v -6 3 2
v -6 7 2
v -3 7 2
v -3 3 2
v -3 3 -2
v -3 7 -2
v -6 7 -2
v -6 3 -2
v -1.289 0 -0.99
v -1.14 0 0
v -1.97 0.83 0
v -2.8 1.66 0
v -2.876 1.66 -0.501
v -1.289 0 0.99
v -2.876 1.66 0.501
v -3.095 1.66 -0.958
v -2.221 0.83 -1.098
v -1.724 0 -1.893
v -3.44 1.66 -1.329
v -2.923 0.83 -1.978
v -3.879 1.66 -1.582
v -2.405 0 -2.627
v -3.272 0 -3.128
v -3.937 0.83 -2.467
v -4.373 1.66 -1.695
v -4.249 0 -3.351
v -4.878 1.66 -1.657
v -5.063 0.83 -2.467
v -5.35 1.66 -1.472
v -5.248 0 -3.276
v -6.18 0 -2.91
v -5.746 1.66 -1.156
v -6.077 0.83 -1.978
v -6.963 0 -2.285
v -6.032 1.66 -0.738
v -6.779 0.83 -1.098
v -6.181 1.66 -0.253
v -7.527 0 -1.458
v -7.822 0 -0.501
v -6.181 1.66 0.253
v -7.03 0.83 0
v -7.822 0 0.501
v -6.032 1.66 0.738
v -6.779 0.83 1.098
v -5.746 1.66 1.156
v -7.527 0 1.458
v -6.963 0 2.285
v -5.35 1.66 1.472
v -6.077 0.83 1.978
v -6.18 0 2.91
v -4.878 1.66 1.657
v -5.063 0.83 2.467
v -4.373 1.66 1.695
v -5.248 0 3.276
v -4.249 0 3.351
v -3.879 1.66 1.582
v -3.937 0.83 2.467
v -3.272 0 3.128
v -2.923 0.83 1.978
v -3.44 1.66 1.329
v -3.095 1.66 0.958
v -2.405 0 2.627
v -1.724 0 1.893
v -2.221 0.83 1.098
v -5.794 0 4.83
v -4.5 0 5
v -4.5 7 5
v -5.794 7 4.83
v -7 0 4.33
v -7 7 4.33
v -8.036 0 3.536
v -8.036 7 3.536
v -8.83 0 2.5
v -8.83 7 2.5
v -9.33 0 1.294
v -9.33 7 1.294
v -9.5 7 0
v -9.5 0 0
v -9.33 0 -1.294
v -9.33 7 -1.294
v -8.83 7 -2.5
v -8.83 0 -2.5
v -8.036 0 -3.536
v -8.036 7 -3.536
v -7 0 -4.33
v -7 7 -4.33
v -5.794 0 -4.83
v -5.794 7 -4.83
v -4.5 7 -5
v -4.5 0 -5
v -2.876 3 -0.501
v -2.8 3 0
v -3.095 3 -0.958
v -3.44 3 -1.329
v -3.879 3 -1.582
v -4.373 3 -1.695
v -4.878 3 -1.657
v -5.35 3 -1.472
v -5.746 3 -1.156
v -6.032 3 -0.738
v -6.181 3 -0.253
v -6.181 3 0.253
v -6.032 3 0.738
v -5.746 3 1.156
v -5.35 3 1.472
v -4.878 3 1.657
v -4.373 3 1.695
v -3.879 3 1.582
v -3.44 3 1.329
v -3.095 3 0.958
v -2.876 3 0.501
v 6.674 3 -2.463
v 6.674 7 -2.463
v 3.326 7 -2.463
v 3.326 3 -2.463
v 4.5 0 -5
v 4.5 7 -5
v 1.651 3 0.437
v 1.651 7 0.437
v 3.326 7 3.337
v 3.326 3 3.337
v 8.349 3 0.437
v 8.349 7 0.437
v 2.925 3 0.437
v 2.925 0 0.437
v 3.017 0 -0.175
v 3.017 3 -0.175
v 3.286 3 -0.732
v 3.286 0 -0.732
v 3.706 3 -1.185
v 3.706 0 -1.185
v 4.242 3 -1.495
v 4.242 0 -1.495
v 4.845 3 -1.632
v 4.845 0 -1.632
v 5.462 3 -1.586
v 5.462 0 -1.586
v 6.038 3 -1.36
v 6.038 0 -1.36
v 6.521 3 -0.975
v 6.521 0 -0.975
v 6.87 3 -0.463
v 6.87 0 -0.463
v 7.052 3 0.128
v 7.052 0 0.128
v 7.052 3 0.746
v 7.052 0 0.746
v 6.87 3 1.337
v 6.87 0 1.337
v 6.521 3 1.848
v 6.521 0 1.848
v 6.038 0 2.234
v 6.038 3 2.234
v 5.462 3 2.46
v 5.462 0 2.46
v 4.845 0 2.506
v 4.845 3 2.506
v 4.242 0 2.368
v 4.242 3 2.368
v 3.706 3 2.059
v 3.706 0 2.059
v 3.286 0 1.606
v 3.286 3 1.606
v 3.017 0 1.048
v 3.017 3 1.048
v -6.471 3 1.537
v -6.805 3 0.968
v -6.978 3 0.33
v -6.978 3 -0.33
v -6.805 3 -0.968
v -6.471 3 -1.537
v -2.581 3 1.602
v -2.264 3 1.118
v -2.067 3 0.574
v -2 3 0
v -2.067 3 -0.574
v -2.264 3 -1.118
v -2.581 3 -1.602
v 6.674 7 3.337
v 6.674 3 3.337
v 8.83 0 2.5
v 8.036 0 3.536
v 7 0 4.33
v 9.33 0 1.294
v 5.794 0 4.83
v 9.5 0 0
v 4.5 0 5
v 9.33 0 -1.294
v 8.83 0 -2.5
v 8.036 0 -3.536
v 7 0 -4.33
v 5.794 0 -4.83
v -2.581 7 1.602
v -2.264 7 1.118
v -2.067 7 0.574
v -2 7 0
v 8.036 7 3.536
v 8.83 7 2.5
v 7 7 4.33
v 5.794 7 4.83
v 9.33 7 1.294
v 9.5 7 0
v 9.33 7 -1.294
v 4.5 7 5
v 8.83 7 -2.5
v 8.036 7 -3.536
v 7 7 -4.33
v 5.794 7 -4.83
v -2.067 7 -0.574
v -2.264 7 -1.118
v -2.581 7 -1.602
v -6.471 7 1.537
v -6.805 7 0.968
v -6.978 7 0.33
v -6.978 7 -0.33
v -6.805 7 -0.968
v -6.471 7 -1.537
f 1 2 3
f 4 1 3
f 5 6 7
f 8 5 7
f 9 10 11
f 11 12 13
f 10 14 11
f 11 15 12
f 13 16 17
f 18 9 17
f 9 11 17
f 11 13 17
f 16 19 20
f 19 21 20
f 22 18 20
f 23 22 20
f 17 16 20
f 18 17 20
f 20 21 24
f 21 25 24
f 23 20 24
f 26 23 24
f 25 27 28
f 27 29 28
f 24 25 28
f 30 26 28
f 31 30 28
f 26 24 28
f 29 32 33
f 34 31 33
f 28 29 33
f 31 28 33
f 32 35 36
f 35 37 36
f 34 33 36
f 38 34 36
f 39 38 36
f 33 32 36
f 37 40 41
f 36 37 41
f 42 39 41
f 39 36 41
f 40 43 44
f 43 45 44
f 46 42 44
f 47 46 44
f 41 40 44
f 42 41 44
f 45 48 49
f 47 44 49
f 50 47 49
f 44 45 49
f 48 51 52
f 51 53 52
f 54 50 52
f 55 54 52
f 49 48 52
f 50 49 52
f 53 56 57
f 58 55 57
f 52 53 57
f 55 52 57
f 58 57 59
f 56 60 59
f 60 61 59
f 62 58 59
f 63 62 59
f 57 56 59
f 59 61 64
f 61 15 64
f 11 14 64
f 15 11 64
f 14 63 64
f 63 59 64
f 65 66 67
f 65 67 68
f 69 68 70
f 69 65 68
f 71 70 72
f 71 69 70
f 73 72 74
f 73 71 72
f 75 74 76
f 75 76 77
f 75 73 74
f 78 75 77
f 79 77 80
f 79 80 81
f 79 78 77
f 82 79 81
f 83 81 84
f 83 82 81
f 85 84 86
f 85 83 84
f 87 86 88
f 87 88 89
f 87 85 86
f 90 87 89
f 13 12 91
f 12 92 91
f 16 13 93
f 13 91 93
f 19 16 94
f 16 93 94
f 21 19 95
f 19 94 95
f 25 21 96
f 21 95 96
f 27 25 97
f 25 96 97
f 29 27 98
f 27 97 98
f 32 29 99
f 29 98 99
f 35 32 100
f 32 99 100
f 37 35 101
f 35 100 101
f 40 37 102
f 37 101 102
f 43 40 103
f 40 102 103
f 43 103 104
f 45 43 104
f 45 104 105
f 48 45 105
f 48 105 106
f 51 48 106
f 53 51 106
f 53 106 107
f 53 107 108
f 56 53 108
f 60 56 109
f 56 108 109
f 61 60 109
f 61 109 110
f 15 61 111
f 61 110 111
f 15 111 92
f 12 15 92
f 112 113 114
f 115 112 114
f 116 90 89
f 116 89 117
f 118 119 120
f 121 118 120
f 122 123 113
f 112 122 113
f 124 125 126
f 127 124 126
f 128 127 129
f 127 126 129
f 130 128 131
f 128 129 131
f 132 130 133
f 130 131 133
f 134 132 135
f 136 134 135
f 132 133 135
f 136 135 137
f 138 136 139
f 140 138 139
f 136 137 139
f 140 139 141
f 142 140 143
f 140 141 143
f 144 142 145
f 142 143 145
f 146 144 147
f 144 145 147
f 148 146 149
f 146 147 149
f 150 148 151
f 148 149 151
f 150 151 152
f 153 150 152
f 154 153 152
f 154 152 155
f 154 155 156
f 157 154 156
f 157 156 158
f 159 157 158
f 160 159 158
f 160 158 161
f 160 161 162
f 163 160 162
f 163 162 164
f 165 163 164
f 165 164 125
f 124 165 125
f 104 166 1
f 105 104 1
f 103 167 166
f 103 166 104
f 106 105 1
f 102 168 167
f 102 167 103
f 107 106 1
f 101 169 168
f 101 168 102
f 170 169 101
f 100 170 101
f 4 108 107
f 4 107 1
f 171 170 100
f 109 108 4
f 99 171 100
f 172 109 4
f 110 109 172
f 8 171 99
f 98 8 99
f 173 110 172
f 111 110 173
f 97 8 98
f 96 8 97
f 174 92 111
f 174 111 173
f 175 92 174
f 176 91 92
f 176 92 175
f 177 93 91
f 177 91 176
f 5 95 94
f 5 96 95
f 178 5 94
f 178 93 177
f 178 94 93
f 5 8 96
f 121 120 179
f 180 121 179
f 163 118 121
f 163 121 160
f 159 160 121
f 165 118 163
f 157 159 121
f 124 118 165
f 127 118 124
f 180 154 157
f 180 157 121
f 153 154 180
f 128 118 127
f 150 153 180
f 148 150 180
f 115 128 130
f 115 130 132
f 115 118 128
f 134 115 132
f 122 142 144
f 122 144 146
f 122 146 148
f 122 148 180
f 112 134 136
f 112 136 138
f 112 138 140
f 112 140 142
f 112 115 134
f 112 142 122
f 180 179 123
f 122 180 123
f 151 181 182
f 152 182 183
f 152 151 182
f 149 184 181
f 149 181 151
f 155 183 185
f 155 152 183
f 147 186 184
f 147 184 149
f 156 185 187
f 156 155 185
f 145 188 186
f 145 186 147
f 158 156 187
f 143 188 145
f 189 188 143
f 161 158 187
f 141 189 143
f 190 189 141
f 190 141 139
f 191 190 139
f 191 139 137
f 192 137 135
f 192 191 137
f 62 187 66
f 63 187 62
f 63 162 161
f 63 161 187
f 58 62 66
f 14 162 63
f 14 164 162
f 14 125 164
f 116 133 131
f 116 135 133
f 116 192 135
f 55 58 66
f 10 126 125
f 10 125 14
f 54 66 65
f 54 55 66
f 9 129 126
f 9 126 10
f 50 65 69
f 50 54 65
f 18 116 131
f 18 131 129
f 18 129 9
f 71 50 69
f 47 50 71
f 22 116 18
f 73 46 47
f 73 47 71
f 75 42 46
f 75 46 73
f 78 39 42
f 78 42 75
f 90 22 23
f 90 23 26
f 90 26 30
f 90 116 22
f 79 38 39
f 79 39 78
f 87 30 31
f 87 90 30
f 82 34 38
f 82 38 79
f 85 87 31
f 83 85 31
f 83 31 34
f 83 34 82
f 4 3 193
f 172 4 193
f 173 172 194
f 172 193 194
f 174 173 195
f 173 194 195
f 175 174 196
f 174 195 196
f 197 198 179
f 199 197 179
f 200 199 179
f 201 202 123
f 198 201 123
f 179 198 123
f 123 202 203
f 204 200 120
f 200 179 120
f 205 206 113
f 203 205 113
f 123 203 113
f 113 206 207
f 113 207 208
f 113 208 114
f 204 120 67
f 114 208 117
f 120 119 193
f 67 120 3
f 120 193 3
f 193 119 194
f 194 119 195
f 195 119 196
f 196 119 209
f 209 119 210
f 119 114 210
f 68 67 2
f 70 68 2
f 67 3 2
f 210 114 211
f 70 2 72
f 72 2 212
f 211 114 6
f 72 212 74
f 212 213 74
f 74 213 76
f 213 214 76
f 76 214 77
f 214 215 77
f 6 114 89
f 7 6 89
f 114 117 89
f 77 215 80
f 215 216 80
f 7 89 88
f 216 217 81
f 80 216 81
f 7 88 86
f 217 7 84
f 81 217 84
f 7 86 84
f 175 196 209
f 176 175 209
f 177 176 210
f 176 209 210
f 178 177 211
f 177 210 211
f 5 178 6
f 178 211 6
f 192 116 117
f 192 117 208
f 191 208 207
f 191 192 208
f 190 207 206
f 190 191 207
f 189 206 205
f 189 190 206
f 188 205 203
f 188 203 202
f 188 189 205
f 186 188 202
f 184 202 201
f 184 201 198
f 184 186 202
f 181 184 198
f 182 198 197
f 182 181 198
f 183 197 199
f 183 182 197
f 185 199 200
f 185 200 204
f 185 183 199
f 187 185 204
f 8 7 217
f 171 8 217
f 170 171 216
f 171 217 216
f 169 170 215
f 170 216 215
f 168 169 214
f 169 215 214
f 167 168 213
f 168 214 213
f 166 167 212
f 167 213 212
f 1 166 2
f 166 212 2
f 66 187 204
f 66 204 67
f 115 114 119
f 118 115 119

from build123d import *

# Parameters (mm, degrees)
EXTRUDE_1_DEPTH              = 7
CUT_EXTRUDE_1_DEPTH          = 4
HOLE_WIZARD_M3_1_D           = 3.4
HOLE_WIZARD_M3_1_DEPTH       = 7.5
HOLE_WIZARD_M3_1_CSINK_D     = 6.72
HOLE_WIZARD_M3_1_CSINK_ANGLE = 90
HOLE_WIZARD_M3_1_TIP         = 1.021463052
HOLE_WIZARD_1_D              = 4.15
CUT_EXTRUDE_2_DEPTH          = 4


with BuildPart() as part:
    # 草图1 → 凸台-拉伸1 (new body)
    with BuildSketch(Plane(origin=(0, 0, 0), x_dir=(1, 0, 0), z_dir=(0, 1, 0))):
        with BuildLine():
            Line((-4.5, 5), (4.5, 5))
            ThreePointArc((4.5, 5), (9.5, 0), (4.5, -5))
            Line((4.5, -5), (-4.5, -5))
            ThreePointArc((-4.5, -5), (-9.5, 0), (-4.5, 5))
        make_face()
    extrude(amount=EXTRUDE_1_DEPTH)

    # 草图2 → 切除-拉伸1 (cut)
    with BuildSketch(Plane(origin=(0, 7, 0), x_dir=(1, 0, 0), z_dir=(0, 1, 0))):
        with BuildLine():
            Line((-3, 2), (-6, 2))
            ThreePointArc((-6, 2), (-7, 0), (-6, -2))
            Line((-6, -2), (-3, -2))
            ThreePointArc((-3, -2), (-2.263932023, -1.118033989), (-2, 0))
            ThreePointArc((-2, 0), (-2.263932023, 1.118033989), (-3, 2))
        make_face()
    extrude(amount=-CUT_EXTRUDE_1_DEPTH, mode=Mode.SUBTRACT)

    # M3 六角凹锥坑螺钉的锥形沉头孔1
    with Locations(Plane(origin=(0, 0, 0), x_dir=(-1, 0, 0), z_dir=(0, -1, 0))):
        with Locations((4.5, 0)):
            CounterSinkHole(HOLE_WIZARD_M3_1_D / 2, HOLE_WIZARD_M3_1_CSINK_D / 2, depth=HOLE_WIZARD_M3_1_DEPTH, counter_sink_angle=HOLE_WIZARD_M3_1_CSINK_ANGLE)
            with Locations((0, 0, -(HOLE_WIZARD_M3_1_DEPTH + HOLE_WIZARD_M3_1_TIP / 2))):  # 118° drill point
                Cone(0, HOLE_WIZARD_M3_1_D / 2, HOLE_WIZARD_M3_1_TIP, mode=Mode.SUBTRACT)

    # 孔1 (through all)
    with Locations(Plane(origin=(0, 7, 0), x_dir=(1, 0, 0), z_dir=(0, 1, 0))):
        with Locations((5, -0.436816998)):
            Hole(HOLE_WIZARD_1_D / 2)

    # 草图12 → 切除-拉伸2 (cut)
    with BuildSketch(Plane(origin=(0, 7, 0), x_dir=(1, 0, 0), z_dir=(0, 1, 0))):
        Polygon((8.348631561, -0.436816998), (6.674315781, 2.463183002), (3.325684219, 2.463183002), (1.651368439, -0.436816998), (3.325684219, -3.336816998), (6.674315781, -3.336816998), align=None)
    extrude(amount=-CUT_EXTRUDE_2_DEPTH, mode=Mode.SUBTRACT)


solid = part.part
